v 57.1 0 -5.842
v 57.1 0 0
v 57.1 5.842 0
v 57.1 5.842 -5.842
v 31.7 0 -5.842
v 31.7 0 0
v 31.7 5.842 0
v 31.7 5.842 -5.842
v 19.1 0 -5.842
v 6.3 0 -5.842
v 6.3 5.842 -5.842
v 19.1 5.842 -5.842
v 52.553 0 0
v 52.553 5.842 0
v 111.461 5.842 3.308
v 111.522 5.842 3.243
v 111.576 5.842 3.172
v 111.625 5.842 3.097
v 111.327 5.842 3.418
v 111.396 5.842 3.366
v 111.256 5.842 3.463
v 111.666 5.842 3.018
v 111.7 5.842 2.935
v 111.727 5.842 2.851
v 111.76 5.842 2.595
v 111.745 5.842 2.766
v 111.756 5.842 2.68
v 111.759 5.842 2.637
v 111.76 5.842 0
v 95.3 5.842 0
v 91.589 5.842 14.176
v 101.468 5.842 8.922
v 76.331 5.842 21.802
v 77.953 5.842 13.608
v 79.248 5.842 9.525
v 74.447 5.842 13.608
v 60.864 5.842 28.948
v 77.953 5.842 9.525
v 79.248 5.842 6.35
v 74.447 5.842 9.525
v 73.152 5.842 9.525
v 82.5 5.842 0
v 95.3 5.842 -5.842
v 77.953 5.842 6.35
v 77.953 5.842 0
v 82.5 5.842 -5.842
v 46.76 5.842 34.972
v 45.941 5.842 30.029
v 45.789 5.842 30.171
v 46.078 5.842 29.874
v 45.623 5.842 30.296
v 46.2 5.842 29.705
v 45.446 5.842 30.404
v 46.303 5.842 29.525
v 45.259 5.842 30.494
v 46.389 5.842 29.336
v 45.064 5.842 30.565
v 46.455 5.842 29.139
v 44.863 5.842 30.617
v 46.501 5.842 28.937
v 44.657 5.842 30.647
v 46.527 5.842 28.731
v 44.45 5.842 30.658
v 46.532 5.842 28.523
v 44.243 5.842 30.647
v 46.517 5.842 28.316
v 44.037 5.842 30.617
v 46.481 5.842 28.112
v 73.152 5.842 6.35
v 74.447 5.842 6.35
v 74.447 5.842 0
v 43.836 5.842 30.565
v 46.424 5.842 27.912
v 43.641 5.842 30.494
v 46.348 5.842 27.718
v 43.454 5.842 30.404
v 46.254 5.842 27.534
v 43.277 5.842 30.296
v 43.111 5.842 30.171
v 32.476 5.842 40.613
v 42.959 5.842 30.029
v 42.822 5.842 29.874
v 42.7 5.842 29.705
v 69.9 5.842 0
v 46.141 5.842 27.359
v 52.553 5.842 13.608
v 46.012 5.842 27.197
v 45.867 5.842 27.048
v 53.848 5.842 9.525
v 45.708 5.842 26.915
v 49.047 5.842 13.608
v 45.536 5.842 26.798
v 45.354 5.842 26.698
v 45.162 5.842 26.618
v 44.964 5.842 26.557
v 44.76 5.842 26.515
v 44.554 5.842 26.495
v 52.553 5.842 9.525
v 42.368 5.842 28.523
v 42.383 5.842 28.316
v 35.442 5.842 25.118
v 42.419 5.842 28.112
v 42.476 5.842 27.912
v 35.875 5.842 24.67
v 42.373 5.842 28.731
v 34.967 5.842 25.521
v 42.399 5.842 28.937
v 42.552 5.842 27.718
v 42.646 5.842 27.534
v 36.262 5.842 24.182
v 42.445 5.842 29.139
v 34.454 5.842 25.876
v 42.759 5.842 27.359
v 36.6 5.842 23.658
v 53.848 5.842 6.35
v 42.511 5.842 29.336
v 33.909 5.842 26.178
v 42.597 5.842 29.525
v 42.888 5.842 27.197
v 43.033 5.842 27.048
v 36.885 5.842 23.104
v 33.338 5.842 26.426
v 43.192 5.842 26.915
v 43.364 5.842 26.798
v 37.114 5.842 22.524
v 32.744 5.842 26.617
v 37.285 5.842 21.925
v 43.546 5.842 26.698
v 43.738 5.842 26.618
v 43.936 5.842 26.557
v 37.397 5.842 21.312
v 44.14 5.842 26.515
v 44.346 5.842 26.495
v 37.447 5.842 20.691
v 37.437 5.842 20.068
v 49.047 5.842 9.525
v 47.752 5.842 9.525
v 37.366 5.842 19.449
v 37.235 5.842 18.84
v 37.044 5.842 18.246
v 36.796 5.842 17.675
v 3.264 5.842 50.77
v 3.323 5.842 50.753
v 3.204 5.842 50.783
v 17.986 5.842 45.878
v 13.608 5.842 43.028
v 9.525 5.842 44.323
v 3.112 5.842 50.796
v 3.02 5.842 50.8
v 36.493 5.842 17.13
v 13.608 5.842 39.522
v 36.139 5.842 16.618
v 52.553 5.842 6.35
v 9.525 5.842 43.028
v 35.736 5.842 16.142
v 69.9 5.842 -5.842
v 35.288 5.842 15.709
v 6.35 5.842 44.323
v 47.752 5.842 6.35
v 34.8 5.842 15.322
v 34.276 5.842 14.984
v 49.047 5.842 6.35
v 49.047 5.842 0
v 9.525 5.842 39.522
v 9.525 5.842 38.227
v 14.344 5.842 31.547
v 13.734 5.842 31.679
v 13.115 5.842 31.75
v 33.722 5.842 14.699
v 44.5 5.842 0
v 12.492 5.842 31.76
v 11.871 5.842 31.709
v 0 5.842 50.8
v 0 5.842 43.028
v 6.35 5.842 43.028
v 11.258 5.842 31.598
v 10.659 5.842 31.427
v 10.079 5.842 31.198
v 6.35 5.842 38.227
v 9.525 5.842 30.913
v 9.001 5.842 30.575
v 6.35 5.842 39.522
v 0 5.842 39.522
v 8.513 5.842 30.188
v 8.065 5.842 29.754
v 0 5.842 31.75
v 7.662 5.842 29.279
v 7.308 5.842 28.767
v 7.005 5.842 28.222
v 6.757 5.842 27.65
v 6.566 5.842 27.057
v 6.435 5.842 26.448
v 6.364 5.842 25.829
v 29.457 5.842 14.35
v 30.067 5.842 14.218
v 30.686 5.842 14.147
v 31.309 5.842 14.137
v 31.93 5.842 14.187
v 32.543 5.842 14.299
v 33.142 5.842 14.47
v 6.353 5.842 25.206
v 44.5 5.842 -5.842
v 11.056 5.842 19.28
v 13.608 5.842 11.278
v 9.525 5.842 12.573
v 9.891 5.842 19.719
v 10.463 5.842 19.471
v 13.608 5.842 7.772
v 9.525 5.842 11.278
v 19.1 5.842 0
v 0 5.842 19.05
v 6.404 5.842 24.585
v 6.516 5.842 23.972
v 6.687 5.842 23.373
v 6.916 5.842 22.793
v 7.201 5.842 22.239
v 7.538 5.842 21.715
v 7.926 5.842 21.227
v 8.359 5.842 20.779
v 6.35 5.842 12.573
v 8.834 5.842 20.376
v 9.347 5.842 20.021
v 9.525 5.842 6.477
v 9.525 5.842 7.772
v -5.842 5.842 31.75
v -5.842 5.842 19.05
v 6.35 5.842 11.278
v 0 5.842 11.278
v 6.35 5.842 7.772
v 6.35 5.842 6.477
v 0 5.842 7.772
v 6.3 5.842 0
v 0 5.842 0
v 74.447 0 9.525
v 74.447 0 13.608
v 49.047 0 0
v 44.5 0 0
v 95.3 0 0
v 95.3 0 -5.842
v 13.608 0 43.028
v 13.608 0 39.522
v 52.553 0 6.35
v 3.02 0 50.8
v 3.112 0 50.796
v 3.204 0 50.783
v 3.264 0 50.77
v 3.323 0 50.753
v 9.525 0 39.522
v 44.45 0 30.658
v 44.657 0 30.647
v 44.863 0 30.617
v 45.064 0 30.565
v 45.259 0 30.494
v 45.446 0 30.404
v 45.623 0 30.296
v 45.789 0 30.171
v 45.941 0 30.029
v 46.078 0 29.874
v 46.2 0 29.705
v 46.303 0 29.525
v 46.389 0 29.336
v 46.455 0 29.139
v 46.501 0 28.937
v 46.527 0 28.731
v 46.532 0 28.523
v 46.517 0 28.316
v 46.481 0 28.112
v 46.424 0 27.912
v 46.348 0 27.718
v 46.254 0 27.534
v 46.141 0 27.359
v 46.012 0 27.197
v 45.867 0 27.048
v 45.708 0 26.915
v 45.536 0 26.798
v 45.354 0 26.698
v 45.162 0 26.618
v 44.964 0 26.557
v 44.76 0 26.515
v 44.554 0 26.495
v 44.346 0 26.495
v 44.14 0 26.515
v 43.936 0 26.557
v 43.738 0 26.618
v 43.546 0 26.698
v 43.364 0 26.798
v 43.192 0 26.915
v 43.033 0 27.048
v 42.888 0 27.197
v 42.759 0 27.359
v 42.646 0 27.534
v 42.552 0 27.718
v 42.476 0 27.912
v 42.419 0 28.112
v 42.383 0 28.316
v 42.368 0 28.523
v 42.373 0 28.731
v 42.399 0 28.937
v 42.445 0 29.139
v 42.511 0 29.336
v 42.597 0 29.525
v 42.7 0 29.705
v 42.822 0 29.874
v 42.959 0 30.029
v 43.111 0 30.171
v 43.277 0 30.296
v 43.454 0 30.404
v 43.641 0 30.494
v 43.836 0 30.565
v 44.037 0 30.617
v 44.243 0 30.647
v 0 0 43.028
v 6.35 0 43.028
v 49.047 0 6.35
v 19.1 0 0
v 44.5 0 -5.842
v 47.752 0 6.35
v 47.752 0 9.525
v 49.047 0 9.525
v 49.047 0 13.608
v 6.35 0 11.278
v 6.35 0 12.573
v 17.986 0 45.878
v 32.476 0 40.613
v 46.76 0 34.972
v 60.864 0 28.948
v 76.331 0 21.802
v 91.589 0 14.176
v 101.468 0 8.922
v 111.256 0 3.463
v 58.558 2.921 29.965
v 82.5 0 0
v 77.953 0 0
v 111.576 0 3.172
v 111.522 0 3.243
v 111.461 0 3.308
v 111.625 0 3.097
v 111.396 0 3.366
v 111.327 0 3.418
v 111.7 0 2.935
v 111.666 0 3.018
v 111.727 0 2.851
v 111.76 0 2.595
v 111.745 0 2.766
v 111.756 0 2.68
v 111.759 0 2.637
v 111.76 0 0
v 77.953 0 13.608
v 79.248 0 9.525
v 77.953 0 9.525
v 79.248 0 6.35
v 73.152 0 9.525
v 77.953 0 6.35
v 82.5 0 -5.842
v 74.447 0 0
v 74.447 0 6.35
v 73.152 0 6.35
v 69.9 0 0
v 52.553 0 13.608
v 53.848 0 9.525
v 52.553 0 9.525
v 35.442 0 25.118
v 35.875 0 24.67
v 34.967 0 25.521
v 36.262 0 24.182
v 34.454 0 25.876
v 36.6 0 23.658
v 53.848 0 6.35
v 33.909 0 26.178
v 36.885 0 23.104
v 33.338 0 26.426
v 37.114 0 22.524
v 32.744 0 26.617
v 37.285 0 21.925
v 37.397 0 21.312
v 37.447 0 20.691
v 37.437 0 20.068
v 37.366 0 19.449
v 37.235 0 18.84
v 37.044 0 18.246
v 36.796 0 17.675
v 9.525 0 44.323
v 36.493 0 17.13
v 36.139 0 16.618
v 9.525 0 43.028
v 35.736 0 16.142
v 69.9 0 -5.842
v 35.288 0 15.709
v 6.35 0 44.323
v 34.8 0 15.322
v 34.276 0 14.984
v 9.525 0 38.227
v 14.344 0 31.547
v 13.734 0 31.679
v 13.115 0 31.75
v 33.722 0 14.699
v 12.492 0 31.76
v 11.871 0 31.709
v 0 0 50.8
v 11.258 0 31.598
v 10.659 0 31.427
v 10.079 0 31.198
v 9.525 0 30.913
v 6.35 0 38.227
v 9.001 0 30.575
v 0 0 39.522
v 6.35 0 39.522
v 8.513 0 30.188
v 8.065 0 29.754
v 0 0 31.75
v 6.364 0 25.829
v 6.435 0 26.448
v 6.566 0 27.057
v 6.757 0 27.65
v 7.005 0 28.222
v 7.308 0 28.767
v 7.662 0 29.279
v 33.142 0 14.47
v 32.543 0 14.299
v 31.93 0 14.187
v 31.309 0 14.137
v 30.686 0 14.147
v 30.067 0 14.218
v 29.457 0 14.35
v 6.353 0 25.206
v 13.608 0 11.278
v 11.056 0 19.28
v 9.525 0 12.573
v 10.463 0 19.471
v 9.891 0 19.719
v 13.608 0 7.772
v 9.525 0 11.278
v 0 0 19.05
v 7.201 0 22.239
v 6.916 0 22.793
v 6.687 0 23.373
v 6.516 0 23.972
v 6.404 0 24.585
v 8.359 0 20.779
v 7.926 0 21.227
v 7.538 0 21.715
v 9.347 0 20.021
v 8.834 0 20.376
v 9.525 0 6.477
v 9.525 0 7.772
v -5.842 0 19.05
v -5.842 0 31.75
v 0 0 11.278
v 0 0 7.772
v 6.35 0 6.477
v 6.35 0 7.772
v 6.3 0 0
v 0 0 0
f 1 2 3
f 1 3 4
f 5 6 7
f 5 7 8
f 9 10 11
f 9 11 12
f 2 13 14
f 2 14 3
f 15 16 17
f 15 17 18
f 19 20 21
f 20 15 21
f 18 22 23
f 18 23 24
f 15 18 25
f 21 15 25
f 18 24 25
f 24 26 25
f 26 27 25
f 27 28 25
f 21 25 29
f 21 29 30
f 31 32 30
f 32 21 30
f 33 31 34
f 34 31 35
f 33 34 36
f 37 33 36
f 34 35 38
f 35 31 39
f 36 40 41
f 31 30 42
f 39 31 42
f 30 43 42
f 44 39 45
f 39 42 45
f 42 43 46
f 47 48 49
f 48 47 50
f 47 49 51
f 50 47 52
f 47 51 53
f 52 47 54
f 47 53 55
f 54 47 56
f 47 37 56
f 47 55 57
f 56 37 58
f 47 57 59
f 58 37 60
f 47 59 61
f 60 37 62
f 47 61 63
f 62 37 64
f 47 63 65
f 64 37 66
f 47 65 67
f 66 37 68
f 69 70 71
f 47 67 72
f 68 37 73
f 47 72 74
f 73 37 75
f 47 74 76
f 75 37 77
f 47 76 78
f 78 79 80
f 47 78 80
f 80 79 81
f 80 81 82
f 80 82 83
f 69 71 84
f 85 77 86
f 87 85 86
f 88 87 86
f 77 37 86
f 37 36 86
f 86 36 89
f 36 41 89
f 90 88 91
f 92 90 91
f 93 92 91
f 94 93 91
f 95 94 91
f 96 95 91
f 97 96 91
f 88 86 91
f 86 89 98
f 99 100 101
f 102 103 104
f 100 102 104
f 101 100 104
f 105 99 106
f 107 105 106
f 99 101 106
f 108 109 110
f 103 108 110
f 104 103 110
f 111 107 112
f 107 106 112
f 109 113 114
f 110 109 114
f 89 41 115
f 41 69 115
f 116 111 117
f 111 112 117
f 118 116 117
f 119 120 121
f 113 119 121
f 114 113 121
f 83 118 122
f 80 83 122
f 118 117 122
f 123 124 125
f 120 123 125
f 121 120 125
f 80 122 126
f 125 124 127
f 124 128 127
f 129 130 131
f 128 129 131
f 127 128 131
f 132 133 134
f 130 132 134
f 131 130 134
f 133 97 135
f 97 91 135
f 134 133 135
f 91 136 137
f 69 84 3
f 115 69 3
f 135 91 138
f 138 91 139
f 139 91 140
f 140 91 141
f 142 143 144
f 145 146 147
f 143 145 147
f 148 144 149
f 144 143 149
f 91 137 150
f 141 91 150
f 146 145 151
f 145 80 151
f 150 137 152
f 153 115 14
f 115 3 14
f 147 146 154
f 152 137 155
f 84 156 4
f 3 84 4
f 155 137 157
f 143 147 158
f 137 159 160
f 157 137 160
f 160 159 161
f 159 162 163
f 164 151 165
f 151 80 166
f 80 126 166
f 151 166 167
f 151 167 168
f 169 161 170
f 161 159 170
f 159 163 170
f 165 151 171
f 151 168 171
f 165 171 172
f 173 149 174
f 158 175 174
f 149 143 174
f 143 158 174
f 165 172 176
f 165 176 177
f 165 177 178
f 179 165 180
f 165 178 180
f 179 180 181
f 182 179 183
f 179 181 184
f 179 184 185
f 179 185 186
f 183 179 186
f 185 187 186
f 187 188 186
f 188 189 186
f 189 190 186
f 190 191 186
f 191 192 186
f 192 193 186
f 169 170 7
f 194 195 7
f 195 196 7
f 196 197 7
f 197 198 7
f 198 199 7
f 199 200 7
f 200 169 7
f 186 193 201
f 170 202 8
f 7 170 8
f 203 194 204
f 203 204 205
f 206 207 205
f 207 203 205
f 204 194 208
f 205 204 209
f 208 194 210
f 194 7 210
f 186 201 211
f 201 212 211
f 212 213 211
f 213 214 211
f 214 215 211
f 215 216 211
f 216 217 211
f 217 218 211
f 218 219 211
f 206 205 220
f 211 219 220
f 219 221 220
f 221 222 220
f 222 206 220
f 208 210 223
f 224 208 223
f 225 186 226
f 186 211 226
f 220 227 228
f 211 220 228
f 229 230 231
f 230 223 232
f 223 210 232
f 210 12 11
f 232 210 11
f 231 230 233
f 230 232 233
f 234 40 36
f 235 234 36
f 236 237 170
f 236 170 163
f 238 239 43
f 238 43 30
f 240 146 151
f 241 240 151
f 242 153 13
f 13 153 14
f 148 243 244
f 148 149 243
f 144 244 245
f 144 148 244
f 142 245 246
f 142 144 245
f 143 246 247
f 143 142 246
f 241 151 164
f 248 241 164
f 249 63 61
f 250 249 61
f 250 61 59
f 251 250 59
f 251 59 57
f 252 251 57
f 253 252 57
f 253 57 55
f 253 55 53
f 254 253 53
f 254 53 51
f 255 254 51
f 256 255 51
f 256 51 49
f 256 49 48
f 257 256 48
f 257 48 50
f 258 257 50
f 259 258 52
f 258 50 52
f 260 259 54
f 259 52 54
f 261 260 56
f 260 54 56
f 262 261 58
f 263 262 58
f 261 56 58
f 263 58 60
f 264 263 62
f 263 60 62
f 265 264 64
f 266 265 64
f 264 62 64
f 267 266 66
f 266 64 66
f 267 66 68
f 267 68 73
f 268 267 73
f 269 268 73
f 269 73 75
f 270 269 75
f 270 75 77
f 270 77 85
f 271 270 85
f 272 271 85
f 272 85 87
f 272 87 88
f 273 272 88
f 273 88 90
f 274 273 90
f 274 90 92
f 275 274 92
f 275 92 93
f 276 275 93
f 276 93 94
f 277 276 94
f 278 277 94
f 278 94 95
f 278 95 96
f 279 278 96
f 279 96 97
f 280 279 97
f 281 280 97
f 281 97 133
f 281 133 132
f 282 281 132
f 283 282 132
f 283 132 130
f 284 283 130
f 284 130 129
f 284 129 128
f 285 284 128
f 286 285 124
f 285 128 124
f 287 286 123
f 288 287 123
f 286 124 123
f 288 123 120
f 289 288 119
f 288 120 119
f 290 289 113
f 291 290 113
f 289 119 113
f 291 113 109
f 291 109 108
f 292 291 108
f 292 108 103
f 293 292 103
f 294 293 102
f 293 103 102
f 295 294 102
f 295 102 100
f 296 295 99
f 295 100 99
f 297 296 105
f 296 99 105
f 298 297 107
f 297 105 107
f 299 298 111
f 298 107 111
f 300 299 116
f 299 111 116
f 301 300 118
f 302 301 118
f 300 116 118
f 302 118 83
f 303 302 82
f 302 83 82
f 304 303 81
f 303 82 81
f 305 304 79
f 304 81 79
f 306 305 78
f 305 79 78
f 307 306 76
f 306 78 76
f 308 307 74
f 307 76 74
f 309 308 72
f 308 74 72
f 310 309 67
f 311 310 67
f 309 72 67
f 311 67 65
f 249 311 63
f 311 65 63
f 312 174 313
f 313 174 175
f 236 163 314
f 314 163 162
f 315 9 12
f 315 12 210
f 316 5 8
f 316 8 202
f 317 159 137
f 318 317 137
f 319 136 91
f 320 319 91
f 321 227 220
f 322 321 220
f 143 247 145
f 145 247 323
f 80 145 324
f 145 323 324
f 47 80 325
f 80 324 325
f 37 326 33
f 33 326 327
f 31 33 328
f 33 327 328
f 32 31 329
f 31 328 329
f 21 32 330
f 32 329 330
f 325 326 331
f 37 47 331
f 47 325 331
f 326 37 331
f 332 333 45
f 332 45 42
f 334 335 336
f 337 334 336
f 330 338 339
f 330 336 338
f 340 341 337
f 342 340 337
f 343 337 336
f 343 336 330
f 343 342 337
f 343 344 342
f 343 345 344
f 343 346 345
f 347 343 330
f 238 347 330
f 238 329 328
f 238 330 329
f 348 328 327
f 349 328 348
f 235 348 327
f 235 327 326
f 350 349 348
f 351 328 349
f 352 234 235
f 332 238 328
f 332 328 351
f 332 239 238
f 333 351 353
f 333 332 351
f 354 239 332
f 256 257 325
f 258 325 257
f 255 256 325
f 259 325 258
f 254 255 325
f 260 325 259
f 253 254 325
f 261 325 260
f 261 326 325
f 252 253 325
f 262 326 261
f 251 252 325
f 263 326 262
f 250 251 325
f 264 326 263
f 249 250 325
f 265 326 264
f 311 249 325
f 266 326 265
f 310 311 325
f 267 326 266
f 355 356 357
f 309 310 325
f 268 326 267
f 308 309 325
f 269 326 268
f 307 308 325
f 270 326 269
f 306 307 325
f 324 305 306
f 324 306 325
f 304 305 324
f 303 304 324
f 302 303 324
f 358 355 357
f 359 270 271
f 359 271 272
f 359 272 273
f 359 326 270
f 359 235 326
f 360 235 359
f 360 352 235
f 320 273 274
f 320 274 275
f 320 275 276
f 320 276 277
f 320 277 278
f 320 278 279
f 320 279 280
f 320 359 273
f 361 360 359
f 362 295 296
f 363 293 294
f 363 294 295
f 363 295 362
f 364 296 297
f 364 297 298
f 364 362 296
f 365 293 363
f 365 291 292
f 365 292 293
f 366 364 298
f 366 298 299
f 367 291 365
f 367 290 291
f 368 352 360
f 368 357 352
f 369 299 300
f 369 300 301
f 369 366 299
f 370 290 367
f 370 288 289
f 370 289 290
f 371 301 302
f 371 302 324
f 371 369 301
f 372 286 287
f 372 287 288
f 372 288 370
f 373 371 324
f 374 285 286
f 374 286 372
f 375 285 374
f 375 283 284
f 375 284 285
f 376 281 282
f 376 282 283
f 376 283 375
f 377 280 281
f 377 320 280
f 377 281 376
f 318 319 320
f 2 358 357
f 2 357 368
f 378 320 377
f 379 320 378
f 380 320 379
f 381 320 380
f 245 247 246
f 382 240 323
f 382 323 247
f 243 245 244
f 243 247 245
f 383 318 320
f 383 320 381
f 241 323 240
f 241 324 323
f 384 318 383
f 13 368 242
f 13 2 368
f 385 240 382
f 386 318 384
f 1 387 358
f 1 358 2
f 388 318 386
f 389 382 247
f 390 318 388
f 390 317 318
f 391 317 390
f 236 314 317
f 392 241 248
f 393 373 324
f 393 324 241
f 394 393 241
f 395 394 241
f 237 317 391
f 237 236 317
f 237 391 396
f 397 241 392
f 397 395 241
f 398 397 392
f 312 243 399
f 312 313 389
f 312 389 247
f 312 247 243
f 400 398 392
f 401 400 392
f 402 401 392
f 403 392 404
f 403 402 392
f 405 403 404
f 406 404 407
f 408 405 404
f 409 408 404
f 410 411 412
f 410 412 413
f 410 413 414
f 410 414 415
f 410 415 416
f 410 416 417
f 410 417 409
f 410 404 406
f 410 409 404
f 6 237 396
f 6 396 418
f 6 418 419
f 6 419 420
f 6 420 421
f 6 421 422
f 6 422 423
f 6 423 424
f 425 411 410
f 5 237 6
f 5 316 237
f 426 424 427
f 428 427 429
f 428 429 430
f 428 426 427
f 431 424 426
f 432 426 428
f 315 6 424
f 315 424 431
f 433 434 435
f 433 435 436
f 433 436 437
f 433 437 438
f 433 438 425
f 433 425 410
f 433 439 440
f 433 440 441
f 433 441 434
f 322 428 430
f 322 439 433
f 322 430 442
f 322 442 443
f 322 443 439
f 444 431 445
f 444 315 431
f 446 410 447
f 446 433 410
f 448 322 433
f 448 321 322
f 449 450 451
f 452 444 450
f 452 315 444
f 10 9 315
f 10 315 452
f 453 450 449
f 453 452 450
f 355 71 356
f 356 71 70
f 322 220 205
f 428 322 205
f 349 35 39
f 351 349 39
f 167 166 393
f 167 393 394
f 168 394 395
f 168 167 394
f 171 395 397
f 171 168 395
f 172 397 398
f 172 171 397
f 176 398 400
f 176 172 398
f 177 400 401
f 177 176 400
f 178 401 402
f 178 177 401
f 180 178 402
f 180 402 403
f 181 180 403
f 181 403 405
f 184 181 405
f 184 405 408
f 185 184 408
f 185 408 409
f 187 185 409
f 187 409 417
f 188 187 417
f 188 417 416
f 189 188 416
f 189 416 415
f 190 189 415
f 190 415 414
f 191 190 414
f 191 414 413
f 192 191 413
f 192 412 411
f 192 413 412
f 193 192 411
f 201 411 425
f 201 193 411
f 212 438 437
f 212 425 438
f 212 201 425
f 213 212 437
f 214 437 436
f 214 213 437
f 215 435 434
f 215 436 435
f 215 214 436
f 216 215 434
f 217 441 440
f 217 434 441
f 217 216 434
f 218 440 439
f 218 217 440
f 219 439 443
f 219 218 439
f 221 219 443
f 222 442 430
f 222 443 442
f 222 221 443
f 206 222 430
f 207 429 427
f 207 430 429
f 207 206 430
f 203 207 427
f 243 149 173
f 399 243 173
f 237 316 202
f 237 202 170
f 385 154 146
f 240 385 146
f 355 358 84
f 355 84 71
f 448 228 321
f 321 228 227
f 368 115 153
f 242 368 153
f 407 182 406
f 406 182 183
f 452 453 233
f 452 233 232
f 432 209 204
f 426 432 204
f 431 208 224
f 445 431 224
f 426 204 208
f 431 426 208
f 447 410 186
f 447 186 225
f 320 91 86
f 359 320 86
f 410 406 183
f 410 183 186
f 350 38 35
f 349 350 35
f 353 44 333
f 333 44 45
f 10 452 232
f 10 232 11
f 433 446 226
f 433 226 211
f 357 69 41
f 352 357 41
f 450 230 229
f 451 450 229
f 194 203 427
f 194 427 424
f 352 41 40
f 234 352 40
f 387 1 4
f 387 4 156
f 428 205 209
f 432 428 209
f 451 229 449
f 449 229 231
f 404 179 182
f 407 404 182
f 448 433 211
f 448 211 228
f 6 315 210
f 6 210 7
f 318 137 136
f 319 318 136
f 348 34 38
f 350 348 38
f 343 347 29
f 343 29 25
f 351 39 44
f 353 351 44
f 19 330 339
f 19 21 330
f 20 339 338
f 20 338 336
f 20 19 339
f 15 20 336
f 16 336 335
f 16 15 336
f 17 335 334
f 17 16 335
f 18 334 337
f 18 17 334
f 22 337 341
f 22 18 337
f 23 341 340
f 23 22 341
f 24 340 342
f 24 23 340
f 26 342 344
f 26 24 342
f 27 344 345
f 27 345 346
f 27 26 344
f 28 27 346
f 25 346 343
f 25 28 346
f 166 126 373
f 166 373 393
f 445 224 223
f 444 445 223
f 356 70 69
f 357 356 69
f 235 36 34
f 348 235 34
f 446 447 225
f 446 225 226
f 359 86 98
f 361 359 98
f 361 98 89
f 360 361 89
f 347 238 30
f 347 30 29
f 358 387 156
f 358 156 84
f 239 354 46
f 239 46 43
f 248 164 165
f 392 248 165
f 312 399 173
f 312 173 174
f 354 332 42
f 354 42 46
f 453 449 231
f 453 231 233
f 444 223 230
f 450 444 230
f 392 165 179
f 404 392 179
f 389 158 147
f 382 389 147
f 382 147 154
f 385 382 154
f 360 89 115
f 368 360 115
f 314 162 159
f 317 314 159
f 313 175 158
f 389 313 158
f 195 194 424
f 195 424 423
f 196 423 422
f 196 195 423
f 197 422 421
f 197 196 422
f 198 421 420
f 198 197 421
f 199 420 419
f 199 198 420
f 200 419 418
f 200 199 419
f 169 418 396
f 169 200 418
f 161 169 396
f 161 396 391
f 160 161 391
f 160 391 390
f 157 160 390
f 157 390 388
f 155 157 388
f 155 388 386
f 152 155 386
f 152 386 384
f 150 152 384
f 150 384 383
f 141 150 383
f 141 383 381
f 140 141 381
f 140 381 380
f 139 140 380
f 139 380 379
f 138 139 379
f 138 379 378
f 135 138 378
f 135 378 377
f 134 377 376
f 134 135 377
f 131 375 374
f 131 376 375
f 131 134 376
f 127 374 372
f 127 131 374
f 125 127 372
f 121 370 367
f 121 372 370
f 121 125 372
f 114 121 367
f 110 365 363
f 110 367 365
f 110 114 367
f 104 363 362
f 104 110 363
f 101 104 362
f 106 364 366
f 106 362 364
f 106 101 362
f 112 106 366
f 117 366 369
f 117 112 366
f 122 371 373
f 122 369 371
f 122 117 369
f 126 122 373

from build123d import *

# Parameters (mm, degrees)
BOSS_EXTRUDE1_DEPTH = 5.842
CUT_EXTRUDE1_DEPTH  = 123.902671239
FILLET1_R           = 1
CUT_EXTRUDE2_DEPTH  = 123.902671239
SKETCH5_R           = 2.0828
CUT_EXTRUDE3_DEPTH  = 123.902671239


with BuildPart() as part:
    # Sketch1 → Boss-Extrude1 (new body)
    with BuildSketch(Plane(origin=(0, 0, 0), x_dir=(1, 0, 0), z_dir=(0, 1, 0))):
        with BuildLine():
            Line((0, 0), (6.3, 0))
            Line((6.3, 0), (6.3, 5.842))
            Line((6.3, 5.842), (19.1, 5.842))
            Line((19.1, 5.842), (19.1, 0))
            Line((19.1, 0), (31.7, 0))
            Line((31.7, 0), (31.7, 5.842))
            Line((31.7, 5.842), (44.5, 5.842))
            Line((44.5, 5.842), (44.5, 0))
            Line((44.5, 0), (57.1, 0))
            Line((57.1, 0), (57.1, 5.842))
            Line((57.1, 5.842), (69.9, 5.842))
            Line((69.9, 5.842), (69.9, 0))
            Line((69.9, 0), (82.5, 0))
            Line((82.5, 0), (82.5, 5.842))
            Line((82.5, 5.842), (95.3, 5.842))
            Line((95.3, 5.842), (95.3, 0))
            Line((95.3, 0), (111.76, 0))
            Line((111.76, 0), (111.76, -3.175))
            add(Edge.make_bspline(
                [(3.175, -50.8), (60.036806346, -32.771807959), (111.76, -3.175)],
                knots=[0, 0, 0, 1, 1, 1], degree=2))
            Line((3.175, -50.8), (0, -50.8))
            Line((0, -50.8), (0, -31.75))
            Line((0, -31.75), (-5.842, -31.75))
            Line((-5.842, -31.75), (-5.842, -19.05))
            Line((-5.842, -19.05), (0, -19.05))
            Line((0, -19.05), (0, 0))
        make_face()
    extrude(amount=BOSS_EXTRUDE1_DEPTH)

    # Sketch3 → Cut-Extrude1 (cut, through all)
    with BuildSketch(Plane(origin=(0, 5.842, 0), x_dir=(1, 0, 0), z_dir=(0, 1, 0))):
        with BuildLine():
            Line((11.056499064, -19.28001312), (29.457386054, -14.349510311))
            ThreePointArc((29.457386054, -14.349510311), (37.234515988, -18.839638371), (32.744387927, -26.616768304))
            Line((32.744387927, -26.616768304), (14.343500936, -31.547271114))
            ThreePointArc((14.343500936, -31.547271114), (6.566371003, -27.057143053), (11.056499064, -19.28001312))
        make_face()
    extrude(amount=-CUT_EXTRUDE1_DEPTH, mode=Mode.SUBTRACT)

    # Fillet1
    fillet1_edges = [part.edges().sort_by_distance(p)[0] for p in [
        (3.175, 2.921, 50.8),
        (111.76, 2.921, 3.175),
    ]]
    fillet(fillet1_edges, radius=FILLET1_R)

    # Sketch4 → Cut-Extrude2 (cut, through all)
    with BuildSketch(Plane(origin=(0, 5.842, 0), x_dir=(1, 0, 0), z_dir=(0, 1, 0))):
        Polygon((49.0474, -6.35), (47.752, -6.35), (47.752, -9.525), (49.0474, -9.525), (49.0474, -13.608), (52.5526, -13.608), (52.5526, -9.525), (53.848, -9.525), (53.848, -6.35), (52.5526, -6.35), (52.5526, 0), (49.0474, 0), align=None)
        Polygon((74.4474, -6.35), (73.152, -6.35), (73.152, -9.525), (74.4474, -9.525), (74.4474, -13.608), (77.9526, -13.608), (77.9526, -9.525), (79.248, -9.525), (79.248, -6.35), (77.9526, -6.35), (77.9526, 0), (74.4474, 0), align=None)
        Polygon((9.525, -7.7724), (9.525, -6.477), (6.35, -6.477), (6.35, -7.7724), (0, -7.7724), (0, -11.2776), (6.35, -11.2776), (6.35, -12.573), (9.525, -12.573), (9.525, -11.2776), (13.607999962, -11.2776), (13.607999962, -7.7724), align=None)
        Polygon((6.35, -43.0276), (6.35, -44.323), (9.525, -44.323), (9.525, -43.0276), (13.607999962, -43.0276), (13.607999962, -39.5224), (9.525, -39.5224), (9.525, -38.227), (6.35, -38.227), (6.35, -39.5224), (0, -39.5224), (0, -43.0276), align=None)
    extrude(amount=-CUT_EXTRUDE2_DEPTH, mode=Mode.SUBTRACT)

    # Sketch5 → Cut-Extrude3 (cut, through all)
    with BuildSketch(Plane(origin=(0, 5.842, 0), x_dir=(1, 0, 0), z_dir=(0, 1, 0))):
        with Locations(Location((44.45, -28.575, 0), (0, 0, 270))):
            Circle(SKETCH5_R)
    extrude(amount=-CUT_EXTRUDE3_DEPTH, mode=Mode.SUBTRACT)


solid = part.part
